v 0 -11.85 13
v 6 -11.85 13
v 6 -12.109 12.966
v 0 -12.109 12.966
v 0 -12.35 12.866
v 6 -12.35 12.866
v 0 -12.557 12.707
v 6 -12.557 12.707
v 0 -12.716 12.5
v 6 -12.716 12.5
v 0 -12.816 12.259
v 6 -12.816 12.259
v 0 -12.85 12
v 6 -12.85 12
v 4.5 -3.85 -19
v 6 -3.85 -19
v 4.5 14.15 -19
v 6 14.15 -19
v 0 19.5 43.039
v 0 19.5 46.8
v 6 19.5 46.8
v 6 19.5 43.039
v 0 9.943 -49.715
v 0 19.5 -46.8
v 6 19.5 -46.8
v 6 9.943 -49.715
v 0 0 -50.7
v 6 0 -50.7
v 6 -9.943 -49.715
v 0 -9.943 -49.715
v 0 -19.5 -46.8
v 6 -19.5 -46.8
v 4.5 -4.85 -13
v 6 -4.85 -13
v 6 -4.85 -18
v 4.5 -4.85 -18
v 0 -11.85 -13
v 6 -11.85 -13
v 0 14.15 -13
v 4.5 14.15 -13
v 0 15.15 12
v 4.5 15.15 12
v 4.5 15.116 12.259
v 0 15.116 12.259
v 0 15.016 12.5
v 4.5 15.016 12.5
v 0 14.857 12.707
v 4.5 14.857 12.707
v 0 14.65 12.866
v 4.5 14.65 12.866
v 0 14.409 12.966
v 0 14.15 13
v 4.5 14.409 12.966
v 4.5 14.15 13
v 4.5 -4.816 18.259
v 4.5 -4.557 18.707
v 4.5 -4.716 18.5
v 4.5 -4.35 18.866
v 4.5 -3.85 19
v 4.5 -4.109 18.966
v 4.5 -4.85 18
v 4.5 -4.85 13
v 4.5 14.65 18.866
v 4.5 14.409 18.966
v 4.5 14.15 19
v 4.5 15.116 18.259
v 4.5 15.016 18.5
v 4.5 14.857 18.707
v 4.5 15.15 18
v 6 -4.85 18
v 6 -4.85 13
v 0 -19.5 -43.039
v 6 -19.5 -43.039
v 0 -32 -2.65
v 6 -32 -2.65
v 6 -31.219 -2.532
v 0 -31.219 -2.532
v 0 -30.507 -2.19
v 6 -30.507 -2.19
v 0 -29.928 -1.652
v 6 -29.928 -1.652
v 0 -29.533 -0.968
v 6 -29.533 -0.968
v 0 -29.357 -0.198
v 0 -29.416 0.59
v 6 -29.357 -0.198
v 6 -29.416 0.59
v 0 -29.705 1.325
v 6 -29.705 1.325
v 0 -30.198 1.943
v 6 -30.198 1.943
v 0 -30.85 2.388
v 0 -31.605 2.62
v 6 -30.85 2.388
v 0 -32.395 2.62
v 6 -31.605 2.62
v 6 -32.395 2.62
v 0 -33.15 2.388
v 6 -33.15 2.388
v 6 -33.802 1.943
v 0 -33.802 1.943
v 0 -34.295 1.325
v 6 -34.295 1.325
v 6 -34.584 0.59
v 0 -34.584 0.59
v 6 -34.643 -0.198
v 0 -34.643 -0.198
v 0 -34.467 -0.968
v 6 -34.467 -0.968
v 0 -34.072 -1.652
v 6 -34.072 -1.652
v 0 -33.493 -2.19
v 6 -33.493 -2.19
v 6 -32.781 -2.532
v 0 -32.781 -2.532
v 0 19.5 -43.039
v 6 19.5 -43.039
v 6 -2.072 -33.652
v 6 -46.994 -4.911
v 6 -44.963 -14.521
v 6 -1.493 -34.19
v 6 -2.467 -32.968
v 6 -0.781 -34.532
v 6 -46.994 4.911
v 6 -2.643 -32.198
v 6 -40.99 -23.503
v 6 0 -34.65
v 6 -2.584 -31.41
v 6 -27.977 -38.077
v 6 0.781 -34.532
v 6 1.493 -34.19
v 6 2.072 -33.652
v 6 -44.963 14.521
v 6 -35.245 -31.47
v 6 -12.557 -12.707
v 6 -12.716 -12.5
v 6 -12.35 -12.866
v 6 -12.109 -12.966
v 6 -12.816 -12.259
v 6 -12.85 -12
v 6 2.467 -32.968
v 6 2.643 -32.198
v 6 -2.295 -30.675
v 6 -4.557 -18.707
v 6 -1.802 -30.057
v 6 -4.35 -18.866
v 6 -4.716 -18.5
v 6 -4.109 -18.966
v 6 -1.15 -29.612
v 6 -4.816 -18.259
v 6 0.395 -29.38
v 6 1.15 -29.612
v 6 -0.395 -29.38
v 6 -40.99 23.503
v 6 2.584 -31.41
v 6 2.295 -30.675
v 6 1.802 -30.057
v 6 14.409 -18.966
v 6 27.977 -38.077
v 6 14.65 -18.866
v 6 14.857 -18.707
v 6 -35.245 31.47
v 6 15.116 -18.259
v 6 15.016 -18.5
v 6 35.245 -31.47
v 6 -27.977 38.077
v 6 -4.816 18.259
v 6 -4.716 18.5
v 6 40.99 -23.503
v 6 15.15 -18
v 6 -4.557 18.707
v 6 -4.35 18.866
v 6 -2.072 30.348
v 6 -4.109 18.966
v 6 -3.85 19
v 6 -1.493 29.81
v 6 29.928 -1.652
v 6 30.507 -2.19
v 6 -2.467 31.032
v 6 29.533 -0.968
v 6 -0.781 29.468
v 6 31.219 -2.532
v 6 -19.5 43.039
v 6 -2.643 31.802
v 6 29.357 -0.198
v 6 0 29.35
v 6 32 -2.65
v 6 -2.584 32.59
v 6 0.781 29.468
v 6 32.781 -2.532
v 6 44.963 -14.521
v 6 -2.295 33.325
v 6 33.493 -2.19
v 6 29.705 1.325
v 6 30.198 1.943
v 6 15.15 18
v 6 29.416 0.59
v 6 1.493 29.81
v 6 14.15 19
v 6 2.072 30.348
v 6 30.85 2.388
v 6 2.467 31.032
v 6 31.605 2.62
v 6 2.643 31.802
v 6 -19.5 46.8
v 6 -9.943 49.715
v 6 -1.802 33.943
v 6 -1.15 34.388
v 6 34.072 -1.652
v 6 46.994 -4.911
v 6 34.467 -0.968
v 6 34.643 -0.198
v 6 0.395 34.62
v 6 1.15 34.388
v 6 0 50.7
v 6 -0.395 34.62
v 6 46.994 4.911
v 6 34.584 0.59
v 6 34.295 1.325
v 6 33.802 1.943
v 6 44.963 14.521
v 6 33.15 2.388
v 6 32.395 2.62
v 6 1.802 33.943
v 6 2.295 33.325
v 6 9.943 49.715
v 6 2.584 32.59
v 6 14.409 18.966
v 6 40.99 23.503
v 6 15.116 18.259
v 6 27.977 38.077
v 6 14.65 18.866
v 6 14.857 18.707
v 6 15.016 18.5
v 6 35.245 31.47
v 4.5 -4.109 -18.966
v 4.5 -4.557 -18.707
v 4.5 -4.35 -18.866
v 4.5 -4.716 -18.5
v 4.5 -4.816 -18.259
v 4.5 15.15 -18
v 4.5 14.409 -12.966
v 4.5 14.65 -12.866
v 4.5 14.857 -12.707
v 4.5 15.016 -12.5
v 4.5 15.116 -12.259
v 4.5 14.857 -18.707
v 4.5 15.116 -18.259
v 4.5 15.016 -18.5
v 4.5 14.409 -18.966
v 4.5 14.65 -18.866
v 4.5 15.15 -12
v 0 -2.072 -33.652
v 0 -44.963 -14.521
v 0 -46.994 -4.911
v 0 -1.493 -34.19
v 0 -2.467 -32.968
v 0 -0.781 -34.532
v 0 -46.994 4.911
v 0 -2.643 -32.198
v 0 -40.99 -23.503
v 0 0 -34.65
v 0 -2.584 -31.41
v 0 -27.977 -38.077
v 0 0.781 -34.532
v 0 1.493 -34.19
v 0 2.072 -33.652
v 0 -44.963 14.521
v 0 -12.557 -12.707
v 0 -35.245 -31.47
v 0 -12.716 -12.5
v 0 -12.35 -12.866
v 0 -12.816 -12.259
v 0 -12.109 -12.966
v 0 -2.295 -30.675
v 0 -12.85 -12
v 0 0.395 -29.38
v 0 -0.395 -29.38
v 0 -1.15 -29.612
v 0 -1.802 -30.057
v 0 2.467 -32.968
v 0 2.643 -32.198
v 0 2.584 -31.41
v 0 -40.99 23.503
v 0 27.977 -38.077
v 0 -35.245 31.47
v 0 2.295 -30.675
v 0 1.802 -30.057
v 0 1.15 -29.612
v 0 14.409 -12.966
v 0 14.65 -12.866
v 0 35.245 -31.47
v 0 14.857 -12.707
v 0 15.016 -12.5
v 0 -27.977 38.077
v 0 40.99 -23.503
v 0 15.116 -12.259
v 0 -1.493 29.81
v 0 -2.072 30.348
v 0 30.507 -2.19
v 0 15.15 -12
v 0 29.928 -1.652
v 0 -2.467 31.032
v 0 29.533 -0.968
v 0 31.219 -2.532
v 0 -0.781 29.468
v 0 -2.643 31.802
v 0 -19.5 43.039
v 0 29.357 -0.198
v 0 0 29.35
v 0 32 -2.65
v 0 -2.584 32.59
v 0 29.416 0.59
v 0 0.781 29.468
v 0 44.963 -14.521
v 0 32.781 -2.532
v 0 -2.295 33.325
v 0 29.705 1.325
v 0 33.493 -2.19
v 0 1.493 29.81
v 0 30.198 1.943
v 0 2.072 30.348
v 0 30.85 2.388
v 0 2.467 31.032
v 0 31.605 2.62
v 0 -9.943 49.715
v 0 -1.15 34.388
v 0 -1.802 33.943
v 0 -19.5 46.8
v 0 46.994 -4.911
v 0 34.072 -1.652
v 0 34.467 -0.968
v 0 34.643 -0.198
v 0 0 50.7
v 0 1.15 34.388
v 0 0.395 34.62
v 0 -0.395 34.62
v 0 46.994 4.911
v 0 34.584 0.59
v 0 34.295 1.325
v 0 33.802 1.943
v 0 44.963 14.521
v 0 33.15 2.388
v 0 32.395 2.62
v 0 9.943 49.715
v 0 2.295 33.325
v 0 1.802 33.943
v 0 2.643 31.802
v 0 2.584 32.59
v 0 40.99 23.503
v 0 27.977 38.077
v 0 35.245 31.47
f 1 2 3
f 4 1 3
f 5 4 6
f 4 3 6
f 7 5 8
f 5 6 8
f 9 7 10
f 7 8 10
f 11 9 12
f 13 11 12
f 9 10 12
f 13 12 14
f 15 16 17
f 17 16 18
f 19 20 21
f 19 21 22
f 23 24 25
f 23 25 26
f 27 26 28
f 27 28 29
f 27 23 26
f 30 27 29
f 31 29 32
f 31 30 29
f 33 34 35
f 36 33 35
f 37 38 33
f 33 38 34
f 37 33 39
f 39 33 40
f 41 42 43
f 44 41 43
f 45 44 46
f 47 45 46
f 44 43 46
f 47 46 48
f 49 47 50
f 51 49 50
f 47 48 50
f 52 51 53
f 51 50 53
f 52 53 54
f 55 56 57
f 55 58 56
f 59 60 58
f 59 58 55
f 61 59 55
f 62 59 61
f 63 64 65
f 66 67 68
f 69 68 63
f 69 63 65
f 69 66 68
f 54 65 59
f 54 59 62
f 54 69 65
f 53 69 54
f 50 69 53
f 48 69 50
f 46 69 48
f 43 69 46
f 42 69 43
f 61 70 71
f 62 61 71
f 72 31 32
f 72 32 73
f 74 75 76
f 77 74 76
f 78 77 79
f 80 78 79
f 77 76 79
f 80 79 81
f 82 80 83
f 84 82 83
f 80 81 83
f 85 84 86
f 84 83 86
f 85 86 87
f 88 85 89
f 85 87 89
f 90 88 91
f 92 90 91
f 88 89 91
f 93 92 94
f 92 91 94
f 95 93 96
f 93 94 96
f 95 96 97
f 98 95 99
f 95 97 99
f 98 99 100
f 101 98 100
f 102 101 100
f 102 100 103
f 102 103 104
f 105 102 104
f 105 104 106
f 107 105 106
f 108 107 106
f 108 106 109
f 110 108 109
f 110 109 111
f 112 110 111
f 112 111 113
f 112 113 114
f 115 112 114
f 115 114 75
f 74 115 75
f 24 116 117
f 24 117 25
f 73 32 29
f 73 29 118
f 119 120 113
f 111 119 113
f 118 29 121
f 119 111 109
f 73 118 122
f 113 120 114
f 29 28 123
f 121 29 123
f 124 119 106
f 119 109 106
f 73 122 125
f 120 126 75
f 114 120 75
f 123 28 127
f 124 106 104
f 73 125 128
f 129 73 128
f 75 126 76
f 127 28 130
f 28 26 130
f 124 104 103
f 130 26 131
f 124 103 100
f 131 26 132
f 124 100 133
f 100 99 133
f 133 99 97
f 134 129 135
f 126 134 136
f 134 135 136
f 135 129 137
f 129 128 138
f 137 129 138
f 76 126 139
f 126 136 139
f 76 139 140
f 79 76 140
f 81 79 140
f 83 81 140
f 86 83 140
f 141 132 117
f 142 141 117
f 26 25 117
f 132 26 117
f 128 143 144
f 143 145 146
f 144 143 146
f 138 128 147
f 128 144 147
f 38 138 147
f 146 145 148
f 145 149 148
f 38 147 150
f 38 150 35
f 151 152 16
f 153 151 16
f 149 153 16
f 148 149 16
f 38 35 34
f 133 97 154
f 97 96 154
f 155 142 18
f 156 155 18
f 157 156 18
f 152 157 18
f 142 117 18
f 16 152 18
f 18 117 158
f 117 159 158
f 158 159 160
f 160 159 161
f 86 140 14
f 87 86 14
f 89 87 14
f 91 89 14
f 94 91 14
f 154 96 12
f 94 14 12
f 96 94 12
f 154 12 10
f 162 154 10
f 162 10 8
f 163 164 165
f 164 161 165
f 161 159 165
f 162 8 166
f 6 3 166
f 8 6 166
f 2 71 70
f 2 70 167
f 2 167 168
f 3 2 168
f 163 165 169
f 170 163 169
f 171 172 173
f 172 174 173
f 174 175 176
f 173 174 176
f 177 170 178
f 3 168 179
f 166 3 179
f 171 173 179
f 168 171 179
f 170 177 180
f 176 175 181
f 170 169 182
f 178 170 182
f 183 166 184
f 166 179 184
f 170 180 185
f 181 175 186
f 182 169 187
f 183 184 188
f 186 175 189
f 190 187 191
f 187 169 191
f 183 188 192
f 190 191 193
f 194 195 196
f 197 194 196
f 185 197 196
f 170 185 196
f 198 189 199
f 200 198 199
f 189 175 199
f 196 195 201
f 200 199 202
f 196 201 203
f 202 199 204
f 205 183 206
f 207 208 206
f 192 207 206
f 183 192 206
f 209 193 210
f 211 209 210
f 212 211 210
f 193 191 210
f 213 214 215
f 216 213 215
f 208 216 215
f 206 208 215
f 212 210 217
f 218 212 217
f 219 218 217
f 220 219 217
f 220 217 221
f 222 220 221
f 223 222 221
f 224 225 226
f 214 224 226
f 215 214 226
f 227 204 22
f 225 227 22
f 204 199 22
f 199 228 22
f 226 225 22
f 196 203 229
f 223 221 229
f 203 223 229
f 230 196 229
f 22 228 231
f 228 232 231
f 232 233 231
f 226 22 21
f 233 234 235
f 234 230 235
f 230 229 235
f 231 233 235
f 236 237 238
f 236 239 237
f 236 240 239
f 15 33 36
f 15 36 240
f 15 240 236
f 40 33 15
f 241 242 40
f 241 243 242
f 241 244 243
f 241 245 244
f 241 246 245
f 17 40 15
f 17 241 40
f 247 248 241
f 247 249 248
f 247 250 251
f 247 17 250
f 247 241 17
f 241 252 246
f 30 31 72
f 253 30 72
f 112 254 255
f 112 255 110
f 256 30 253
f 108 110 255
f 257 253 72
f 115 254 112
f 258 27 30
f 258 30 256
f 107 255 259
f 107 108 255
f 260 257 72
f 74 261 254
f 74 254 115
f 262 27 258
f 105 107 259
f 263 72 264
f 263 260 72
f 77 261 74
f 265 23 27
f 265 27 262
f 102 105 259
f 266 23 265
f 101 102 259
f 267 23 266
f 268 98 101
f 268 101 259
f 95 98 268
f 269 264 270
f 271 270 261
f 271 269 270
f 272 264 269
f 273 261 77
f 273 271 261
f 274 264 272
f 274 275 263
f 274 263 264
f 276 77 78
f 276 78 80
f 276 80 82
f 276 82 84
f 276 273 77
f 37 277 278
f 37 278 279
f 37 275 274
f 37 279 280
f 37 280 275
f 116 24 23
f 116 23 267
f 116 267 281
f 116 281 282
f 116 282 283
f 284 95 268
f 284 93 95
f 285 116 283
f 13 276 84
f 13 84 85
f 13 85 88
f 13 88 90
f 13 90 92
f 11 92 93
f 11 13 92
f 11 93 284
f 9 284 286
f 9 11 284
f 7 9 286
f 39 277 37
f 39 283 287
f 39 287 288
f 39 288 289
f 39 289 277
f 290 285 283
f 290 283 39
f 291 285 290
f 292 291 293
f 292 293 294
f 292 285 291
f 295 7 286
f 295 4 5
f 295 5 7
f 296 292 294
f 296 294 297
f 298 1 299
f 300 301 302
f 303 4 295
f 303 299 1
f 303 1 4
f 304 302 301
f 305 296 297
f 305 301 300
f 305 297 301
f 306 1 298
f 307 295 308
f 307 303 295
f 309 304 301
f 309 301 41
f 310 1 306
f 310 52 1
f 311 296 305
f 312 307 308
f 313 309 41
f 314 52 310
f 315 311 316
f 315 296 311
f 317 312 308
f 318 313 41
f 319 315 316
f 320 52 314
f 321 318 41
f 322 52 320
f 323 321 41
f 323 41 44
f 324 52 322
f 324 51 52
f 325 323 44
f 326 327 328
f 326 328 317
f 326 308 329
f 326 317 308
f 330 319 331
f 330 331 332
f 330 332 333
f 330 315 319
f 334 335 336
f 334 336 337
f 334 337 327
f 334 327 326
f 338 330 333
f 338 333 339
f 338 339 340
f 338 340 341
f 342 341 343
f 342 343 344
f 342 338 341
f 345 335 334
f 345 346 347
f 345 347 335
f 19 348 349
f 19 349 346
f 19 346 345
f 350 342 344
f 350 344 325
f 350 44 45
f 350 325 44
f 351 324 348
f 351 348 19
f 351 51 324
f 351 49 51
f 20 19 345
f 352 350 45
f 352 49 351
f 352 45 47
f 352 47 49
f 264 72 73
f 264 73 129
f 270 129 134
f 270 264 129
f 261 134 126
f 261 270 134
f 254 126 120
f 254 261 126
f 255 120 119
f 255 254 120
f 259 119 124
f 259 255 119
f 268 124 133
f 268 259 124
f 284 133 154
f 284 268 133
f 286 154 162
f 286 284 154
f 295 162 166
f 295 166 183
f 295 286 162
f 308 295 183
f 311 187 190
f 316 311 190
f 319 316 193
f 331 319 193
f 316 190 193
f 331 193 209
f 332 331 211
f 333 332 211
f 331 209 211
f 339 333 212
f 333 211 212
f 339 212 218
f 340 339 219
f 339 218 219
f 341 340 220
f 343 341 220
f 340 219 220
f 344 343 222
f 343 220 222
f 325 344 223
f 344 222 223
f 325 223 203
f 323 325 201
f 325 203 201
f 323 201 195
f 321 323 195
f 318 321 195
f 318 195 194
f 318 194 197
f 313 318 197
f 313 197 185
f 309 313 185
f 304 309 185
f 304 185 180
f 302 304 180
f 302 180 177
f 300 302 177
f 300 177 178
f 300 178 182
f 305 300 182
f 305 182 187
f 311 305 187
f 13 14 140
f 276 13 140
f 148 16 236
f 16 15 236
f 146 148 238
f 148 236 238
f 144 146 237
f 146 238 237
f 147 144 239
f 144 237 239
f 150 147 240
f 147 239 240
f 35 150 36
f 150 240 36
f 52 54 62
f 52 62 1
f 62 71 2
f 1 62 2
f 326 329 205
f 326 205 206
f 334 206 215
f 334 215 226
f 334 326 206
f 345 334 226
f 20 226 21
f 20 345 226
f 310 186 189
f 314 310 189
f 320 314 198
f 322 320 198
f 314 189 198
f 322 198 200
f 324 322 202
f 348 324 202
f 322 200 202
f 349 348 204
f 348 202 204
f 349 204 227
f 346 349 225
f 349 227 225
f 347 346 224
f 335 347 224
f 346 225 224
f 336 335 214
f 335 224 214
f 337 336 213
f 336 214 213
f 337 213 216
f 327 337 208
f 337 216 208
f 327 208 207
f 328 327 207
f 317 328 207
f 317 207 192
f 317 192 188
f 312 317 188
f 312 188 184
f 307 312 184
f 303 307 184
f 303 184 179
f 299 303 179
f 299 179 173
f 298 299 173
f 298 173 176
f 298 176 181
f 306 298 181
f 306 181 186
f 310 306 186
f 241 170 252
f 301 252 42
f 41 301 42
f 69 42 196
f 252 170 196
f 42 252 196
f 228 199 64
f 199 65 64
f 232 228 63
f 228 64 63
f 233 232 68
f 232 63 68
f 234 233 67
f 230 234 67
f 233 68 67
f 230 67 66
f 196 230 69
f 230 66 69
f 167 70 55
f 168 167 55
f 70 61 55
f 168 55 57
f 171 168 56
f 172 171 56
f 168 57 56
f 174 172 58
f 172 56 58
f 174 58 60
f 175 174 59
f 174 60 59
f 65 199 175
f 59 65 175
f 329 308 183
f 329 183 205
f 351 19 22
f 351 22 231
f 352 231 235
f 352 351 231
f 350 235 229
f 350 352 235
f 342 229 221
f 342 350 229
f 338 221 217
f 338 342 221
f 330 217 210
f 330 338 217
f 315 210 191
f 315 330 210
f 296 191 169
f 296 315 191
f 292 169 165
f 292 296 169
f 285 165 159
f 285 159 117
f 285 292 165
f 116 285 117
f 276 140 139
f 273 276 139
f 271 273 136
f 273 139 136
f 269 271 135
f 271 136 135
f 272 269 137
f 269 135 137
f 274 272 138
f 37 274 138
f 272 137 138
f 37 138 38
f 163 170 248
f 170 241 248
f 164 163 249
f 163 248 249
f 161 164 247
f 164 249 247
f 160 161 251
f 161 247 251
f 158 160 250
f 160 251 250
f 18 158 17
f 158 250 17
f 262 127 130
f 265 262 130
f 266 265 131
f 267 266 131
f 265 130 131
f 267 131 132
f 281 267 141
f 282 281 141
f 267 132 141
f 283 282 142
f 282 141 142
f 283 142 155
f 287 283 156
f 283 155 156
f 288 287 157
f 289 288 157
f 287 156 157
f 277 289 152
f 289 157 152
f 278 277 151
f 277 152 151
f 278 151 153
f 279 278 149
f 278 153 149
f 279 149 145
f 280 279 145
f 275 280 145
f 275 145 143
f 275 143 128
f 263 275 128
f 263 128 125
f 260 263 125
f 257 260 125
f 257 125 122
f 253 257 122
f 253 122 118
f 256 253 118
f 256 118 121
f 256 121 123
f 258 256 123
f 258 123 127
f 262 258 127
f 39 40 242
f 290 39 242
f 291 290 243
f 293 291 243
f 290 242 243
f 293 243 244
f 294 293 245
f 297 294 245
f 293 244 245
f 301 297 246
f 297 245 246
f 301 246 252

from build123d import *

# Parameters (mm, degrees)
BOSS_EXTRUDE1_DEPTH      = 6
CUT_EXTRUDE1_DEPTH       = 20
M5_CLEARANCE_HOLE1_D     = 5.3
M5_CLEARANCE_HOLE1_DEPTH = 15
M5_CLEARANCE_HOLE1_TIP   = 1.59228064
CUT_EXTRUDE2_DEPTH       = 1.5
FILLET1_R                = 1


with BuildPart() as part:
    # Sketch1 → Boss-Extrude1 (new body)
    with BuildSketch(Plane(origin=(0, 0, 0), x_dir=(0, 0, -1), z_dir=(1, 0, 0))):
        with BuildLine():
            Line((-46.8, 19.5), (-43.038500206, 19.5))
            ThreePointArc((-43.038500206, 19.5), (0, 47.25), (43.038500206, 19.5))
            Line((43.038500206, 19.5), (46.8, 19.5))
            ThreePointArc((46.8, 19.5), (50.7, 0), (46.8, -19.5))
            Line((46.8, -19.5), (43.038500206, -19.5))
            ThreePointArc((43.038500206, -19.5), (0, -47.25), (-43.038500206, -19.5))
            Line((-43.038500206, -19.5), (-46.8, -19.5))
            ThreePointArc((-46.8, -19.5), (-50.7, 0), (-46.8, 19.5))
        make_face()
    extrude(amount=BOSS_EXTRUDE1_DEPTH)

    # Sketch2 → Cut-Extrude1 (cut)
    with BuildSketch(Plane(origin=(6, 0, 0), x_dir=(0, 0, -1), z_dir=(1, 0, 0))):
        with BuildLine():
            ThreePointArc((12, -11.85), (12.707106781, -11.557106781), (13, -10.85))
            Line((13, -10.85), (13, -3.85))
            Line((13, -3.85), (13, 14.15))
            ThreePointArc((13, 14.15), (12.707106781, 14.857106781), (12, 15.15))
            Line((12, 15.15), (-12, 15.15))
            ThreePointArc((-12, 15.15), (-12.707106781, 14.857106781), (-13, 14.15))
            Line((-13, 14.15), (-13, -3.85))
            Line((-13, -3.85), (-13, -10.85))
            ThreePointArc((-13, -10.85), (-12.707106781, -11.557106781), (-12, -11.85))
            Line((-12, -11.85), (12, -11.85))
        make_face()
        with BuildLine():
            Line((-12, -12.85), (12, -12.85))
            ThreePointArc((12, -12.85), (12.707106781, -12.557106781), (13, -11.85))
            Line((13, -11.85), (13, -10.85))
            ThreePointArc((13, -10.85), (12.707106781, -11.557106781), (12, -11.85))
            Line((12, -11.85), (-12, -11.85))
            ThreePointArc((-12, -11.85), (-12.707106781, -11.557106781), (-13, -10.85))
            Line((-13, -10.85), (-13, -11.85))
            ThreePointArc((-13, -11.85), (-12.707106781, -12.557106781), (-12, -12.85))
        make_face()
    extrude(amount=-CUT_EXTRUDE1_DEPTH, mode=Mode.SUBTRACT)

    # M5 Clearance Hole1
    with Locations(Plane.ZY):
        with Locations((-32, 0), (0, 32), (32, 0), (0, -32)):
            Hole(M5_CLEARANCE_HOLE1_D / 2, depth=M5_CLEARANCE_HOLE1_DEPTH)
            with Locations((0, 0, -(M5_CLEARANCE_HOLE1_DEPTH + M5_CLEARANCE_HOLE1_TIP / 2))):  # 118° drill point
                Cone(0, M5_CLEARANCE_HOLE1_D / 2, M5_CLEARANCE_HOLE1_TIP, mode=Mode.SUBTRACT)

    # Sketch16 → Cut-Extrude2 (cut)
    with BuildSketch(Plane(origin=(6, 0, 0), x_dir=(0, 0, -1), z_dir=(1, 0, 0))):
        with BuildLine():
            ThreePointArc((-13, 14.15), (-12.707106781, 14.857106781), (-12, 15.15))
            Line((-12, 15.15), (-19, 15.15))
            Line((-19, 15.15), (-19, -4.85))
            Line((-19, -4.85), (-13, -4.85))
            Line((-13, -4.85), (-13, 14.15))
        make_face()
        with BuildLine():
            Line((0, -4.85), (0, 15.15))
            Line((0, 15.15), (-12, 15.15))
            ThreePointArc((-12, 15.15), (-12.707106781, 14.857106781), (-13, 14.15))
            Line((-13, 14.15), (-13, -4.85))
            Line((-13, -4.85), (0, -4.85))
        make_face()
        with BuildLine():
            ThreePointArc((13, 14.15), (12.707106781, 14.857106781), (12, 15.15))
            Line((12, 15.15), (0, 15.15))
            Line((0, 15.15), (0, -4.85))
            Line((0, -4.85), (13, -4.85))
            Line((13, -4.85), (13, 14.15))
        make_face()
        with BuildLine():
            Line((19, -4.85), (19, 15.15))
            Line((19, 15.15), (12, 15.15))
            ThreePointArc((12, 15.15), (12.707106781, 14.857106781), (13, 14.15))
            Line((13, 14.15), (13, -4.85))
            Line((13, -4.85), (19, -4.85))
        make_face()
    extrude(amount=-CUT_EXTRUDE2_DEPTH, mode=Mode.SUBTRACT)

    # Fillet1
    fillet1_edges = [part.edges().sort_by_distance(p)[0] for p in [
        (5.25, 15.15, 19),
        (5.25, -4.85, -19),
        (5.25, -4.85, 19),
        (5.25, 15.15, -19),
    ]]
    fillet(fillet1_edges, radius=FILLET1_R)


solid = part.part
